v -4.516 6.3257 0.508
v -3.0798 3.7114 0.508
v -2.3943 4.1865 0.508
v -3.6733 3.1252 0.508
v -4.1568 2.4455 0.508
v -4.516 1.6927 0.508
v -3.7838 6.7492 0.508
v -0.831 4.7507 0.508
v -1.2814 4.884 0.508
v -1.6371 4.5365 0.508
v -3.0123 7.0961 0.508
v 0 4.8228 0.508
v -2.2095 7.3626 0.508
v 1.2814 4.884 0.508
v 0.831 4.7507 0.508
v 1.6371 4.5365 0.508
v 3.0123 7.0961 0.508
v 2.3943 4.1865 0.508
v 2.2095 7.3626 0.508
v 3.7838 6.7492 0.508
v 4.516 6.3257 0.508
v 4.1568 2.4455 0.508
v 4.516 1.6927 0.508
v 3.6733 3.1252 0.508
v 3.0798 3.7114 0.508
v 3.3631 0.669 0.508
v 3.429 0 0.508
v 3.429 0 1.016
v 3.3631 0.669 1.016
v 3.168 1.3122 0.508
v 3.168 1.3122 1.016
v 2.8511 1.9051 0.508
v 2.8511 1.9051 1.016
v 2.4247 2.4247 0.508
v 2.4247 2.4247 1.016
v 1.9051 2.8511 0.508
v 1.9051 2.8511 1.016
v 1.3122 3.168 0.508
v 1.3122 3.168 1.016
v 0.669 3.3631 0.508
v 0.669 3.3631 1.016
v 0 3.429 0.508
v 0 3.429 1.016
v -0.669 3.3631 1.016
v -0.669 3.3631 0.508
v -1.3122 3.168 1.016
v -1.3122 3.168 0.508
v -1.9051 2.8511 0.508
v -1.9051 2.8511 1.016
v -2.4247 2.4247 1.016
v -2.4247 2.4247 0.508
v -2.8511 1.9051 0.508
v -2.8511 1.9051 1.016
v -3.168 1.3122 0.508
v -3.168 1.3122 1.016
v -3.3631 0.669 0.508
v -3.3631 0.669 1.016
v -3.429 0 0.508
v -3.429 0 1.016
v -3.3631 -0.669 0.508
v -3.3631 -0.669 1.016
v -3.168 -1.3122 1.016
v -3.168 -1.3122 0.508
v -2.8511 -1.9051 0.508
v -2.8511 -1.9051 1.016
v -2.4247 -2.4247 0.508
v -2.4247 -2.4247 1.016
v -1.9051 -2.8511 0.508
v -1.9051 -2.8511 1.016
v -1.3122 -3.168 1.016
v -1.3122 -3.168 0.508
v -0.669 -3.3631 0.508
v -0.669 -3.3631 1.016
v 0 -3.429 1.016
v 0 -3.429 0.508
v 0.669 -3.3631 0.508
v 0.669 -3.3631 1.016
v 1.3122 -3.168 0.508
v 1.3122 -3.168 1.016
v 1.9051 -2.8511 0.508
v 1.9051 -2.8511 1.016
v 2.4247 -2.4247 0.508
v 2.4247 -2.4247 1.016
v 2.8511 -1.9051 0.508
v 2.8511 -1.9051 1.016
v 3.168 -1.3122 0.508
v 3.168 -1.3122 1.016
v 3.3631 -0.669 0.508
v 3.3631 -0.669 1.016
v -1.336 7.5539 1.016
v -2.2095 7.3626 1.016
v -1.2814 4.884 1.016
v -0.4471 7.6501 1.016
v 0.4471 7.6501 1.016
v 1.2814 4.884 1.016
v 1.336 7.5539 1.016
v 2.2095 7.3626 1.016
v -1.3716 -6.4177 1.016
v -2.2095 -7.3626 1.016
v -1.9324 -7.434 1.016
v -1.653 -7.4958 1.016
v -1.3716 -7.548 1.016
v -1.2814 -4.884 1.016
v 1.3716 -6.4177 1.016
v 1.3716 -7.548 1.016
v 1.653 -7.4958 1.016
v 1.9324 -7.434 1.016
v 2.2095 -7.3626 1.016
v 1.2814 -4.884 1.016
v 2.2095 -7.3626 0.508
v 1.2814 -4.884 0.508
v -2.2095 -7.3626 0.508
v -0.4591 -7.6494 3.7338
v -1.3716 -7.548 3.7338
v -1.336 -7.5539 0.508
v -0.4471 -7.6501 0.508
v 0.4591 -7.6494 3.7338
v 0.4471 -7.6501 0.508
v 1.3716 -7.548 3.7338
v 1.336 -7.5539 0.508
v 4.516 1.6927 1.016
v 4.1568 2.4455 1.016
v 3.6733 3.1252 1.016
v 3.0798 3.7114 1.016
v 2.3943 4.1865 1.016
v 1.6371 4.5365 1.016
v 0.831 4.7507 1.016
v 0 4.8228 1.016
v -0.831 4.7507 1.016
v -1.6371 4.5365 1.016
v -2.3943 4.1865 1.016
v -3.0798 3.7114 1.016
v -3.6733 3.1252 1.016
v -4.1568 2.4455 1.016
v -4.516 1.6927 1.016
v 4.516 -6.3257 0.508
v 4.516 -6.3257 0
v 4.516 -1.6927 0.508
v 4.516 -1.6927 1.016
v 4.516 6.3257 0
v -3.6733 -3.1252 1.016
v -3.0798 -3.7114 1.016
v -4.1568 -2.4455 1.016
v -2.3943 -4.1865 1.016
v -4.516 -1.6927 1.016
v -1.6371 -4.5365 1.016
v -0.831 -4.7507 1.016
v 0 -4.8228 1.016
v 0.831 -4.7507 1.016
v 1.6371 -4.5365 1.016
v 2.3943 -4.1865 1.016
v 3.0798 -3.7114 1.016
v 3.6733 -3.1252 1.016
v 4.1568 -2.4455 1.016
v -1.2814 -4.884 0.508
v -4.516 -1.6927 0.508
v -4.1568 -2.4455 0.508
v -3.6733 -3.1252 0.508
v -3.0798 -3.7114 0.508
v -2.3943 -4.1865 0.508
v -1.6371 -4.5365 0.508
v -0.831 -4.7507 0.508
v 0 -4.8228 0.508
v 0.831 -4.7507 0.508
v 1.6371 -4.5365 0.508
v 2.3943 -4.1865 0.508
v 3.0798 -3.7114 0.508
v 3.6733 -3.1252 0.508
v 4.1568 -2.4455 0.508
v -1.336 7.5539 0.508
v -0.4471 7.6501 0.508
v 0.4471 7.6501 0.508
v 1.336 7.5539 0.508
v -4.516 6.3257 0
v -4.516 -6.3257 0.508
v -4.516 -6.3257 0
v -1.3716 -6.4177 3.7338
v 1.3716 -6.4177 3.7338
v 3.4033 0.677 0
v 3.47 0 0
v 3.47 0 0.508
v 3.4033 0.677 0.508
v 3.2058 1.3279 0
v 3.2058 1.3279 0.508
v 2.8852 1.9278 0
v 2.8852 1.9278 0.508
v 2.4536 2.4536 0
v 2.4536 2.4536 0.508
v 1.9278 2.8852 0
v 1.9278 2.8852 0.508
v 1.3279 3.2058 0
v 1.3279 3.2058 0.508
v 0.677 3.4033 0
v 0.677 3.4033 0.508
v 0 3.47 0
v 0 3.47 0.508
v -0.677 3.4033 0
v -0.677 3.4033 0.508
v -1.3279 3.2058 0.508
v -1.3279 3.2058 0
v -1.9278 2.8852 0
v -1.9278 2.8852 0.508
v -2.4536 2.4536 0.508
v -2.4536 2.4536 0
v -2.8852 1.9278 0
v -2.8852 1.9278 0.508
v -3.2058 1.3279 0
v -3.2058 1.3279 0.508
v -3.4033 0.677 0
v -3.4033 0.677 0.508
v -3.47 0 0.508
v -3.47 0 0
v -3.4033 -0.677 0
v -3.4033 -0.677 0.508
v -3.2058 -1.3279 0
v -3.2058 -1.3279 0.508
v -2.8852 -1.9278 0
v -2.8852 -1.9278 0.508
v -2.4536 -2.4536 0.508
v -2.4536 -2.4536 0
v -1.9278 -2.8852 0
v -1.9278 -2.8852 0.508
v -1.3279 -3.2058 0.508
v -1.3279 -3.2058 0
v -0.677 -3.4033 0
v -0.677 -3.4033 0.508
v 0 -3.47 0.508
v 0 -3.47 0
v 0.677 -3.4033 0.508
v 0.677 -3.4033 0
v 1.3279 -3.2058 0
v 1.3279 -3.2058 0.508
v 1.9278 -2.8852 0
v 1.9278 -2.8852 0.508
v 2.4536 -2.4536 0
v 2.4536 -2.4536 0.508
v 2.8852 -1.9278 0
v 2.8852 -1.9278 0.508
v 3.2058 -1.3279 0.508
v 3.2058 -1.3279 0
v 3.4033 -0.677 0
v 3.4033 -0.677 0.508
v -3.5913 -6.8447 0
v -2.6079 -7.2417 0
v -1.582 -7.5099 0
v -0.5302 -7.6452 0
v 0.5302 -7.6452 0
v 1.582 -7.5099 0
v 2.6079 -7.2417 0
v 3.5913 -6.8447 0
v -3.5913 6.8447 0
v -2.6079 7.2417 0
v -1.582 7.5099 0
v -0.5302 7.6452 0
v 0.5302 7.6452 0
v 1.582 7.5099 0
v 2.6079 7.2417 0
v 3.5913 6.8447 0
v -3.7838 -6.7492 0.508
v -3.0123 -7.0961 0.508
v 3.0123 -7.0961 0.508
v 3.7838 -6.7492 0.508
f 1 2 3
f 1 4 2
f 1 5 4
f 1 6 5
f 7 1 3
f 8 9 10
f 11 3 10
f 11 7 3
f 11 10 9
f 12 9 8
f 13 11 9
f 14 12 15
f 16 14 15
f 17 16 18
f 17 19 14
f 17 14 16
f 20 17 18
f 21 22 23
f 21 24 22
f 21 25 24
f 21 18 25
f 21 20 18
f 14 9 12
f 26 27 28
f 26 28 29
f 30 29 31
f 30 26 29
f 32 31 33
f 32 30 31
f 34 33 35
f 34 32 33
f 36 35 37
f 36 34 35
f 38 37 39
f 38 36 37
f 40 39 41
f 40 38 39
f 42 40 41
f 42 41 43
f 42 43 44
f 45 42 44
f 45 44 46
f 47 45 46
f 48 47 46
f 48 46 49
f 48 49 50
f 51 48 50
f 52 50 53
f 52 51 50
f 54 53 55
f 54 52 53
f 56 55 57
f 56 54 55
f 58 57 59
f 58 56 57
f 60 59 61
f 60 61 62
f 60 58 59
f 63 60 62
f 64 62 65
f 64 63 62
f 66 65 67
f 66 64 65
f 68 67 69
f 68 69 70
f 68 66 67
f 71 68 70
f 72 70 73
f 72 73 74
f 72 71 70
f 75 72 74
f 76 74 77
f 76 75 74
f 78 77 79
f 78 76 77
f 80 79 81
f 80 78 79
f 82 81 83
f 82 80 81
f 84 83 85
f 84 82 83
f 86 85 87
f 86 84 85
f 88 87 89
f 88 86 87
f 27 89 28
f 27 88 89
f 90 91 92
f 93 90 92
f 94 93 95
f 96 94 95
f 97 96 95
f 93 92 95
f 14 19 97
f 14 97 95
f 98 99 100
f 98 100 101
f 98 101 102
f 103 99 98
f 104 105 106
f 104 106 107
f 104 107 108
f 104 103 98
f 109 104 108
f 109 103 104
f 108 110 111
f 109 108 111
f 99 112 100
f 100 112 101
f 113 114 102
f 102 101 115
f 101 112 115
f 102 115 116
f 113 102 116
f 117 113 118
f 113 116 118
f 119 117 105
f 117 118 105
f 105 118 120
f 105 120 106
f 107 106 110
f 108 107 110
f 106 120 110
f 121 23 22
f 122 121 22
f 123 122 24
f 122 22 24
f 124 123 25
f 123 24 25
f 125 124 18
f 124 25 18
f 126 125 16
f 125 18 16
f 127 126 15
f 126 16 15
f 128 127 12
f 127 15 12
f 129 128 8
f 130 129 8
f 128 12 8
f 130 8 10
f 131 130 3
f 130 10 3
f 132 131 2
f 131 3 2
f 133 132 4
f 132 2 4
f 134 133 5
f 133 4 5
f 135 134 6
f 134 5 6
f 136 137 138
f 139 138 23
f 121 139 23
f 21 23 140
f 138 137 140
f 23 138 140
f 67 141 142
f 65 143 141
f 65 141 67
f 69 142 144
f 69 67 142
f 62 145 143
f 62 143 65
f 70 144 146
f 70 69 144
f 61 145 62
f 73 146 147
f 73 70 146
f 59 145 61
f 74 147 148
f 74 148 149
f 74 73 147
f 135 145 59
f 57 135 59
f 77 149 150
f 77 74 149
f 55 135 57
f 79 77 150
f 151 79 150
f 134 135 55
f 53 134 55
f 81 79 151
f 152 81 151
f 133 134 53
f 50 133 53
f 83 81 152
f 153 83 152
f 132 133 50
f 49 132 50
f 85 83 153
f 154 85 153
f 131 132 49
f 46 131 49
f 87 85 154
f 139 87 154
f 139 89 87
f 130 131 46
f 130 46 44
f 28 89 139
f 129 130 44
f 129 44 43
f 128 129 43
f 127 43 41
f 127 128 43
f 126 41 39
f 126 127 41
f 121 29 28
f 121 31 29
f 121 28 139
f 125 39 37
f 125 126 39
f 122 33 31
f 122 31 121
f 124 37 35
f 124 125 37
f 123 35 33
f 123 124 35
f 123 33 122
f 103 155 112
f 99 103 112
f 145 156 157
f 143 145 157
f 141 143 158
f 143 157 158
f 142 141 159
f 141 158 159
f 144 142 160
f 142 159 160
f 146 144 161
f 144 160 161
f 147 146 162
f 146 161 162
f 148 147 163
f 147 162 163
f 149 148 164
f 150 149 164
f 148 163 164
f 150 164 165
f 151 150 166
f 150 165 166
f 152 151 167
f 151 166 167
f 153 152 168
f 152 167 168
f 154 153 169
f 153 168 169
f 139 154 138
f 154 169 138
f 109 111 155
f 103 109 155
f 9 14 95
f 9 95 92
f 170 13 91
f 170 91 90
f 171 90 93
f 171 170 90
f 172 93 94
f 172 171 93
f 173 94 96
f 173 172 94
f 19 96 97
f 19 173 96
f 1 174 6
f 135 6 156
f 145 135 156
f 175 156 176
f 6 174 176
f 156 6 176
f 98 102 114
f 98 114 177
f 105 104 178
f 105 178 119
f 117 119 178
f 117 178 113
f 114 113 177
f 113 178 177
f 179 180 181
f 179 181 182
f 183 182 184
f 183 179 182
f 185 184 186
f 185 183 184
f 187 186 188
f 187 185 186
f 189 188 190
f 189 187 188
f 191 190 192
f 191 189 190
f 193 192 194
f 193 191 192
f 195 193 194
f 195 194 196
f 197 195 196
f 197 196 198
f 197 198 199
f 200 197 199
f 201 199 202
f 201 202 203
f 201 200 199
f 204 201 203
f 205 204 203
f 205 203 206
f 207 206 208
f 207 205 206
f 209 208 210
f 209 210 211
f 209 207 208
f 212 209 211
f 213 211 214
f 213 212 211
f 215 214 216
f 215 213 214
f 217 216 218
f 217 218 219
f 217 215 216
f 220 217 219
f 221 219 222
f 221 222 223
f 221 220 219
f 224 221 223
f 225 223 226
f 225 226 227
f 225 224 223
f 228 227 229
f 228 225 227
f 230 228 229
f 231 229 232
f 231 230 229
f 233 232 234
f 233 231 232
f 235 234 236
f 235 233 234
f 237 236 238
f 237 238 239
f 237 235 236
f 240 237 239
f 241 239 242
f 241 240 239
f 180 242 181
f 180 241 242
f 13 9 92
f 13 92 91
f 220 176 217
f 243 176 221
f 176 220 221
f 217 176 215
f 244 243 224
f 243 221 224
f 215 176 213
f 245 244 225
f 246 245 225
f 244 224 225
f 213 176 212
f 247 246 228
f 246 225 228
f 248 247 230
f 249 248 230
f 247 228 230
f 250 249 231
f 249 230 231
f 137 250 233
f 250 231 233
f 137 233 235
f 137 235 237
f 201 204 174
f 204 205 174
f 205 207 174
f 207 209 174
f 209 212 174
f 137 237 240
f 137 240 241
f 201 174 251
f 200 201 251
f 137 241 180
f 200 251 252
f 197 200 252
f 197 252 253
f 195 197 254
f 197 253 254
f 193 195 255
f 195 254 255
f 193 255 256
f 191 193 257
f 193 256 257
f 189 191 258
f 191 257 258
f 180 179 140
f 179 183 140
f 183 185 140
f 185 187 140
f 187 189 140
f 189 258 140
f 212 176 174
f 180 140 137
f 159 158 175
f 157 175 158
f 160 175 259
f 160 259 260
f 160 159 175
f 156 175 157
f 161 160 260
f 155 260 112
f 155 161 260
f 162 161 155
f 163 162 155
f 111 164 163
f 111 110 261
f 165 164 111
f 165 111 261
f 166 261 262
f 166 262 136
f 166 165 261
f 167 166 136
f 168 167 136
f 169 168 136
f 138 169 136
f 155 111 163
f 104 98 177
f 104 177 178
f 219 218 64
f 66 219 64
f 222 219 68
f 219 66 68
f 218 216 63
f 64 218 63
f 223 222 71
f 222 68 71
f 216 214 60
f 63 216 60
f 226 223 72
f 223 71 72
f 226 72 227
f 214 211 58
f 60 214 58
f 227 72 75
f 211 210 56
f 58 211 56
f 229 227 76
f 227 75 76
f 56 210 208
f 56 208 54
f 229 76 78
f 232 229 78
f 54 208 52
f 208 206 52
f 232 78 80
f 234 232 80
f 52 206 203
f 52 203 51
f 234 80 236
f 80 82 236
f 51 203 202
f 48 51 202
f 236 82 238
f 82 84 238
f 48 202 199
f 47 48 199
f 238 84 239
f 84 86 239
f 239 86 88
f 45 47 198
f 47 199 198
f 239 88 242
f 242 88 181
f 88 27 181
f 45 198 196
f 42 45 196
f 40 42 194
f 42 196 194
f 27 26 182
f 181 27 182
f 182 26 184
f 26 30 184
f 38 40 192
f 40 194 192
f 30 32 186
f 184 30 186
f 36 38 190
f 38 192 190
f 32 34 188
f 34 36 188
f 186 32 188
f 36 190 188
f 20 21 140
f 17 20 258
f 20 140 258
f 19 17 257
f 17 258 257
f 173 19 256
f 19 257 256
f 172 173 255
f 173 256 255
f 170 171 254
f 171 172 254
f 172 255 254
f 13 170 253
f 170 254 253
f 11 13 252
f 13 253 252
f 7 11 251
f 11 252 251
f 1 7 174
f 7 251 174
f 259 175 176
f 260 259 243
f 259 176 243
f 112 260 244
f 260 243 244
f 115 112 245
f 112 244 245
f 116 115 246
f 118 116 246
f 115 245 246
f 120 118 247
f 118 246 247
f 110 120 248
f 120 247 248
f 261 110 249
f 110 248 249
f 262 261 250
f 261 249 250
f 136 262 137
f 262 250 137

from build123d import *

# Parameters (mm, degrees)
SKETCH1_R           = 3.469974147
BOSS_EXTRUDE1_DEPTH = 0.508
BOSS_EXTRUDE2_DEPTH = 0.508
BOSS_EXTRUDE3_DEPTH = 2.7178
SKETCH4_R           = 3.429
BOSS_EXTRUDE4_DEPTH = 0.508


with BuildPart() as part:
    # Sketch1 → Boss-Extrude1 (new body)
    with BuildSketch(Plane.XY):
        with BuildLine():
            Line((-4.516012823, 6.325662964), (-4.516012823, -6.325662964))
            ThreePointArc((-4.516012823, -6.325662964), (0, -7.662131341), (4.516012823, -6.325662964))
            Line((4.516012823, -6.325662964), (4.516012823, 6.325662964))
            ThreePointArc((4.516012823, 6.325662964), (0, 7.662131341), (-4.516012823, 6.325662964))
        make_face()
        Circle(SKETCH1_R, mode=Mode.SUBTRACT)
    extrude(amount=BOSS_EXTRUDE1_DEPTH)

    # Sketch2 → Boss-Extrude2 (add)
    with BuildSketch(Plane.XY.offset(0.508)):
        with BuildLine():
            Line((2.209457086, -7.362582022), (1.281405607, -4.884037371))
            Line((1.281405607, -4.884037371), (-1.281405607, -4.884037371))
            Line((-1.281405607, -4.884037371), (-2.209457086, -7.362582022))
            ThreePointArc((-2.209457086, -7.362582022), (0, -7.662131341), (2.209457086, -7.362582022))
        make_face()
    boss_extrude2 = extrude(amount=BOSS_EXTRUDE2_DEPTH)

    # Sketch3 → Boss-Extrude3 (add)
    with BuildSketch(Plane.XY.offset(1.016)):
        with BuildLine():
            Line((-1.3716, -7.547991025), (-1.3716, -6.417691025))
            Line((-1.3716, -6.417691025), (1.3716, -6.417691025))
            Line((1.3716, -6.417691025), (1.3716, -7.547991025))
            ThreePointArc((1.3716, -7.547991025), (0, -7.662131341), (-1.3716, -7.547991025))
        make_face()
    extrude(amount=BOSS_EXTRUDE3_DEPTH)

    # Sketch4 → Boss-Extrude4 (add)
    with BuildSketch(Plane.XY.offset(0.508)):
        with BuildLine():
            Line((4.516012823, -1.692704651), (4.516012823, 1.692704651))
            ThreePointArc((4.516012823, 1.692704651), (0, 4.822822913), (-4.516012823, 1.692704651))
            Line((-4.516012823, 1.692704651), (-4.516012823, -1.692704651))
            ThreePointArc((-4.516012823, -1.692704651), (0, -4.822822913), (4.516012823, -1.692704651))
        make_face()
        Circle(SKETCH4_R, mode=Mode.SUBTRACT)
    extrude(amount=BOSS_EXTRUDE4_DEPTH)

    # Mirror1: Boss-Extrude2 across plane
    add(boss_extrude2.mirror(Plane.ZX))


solid = part.part
